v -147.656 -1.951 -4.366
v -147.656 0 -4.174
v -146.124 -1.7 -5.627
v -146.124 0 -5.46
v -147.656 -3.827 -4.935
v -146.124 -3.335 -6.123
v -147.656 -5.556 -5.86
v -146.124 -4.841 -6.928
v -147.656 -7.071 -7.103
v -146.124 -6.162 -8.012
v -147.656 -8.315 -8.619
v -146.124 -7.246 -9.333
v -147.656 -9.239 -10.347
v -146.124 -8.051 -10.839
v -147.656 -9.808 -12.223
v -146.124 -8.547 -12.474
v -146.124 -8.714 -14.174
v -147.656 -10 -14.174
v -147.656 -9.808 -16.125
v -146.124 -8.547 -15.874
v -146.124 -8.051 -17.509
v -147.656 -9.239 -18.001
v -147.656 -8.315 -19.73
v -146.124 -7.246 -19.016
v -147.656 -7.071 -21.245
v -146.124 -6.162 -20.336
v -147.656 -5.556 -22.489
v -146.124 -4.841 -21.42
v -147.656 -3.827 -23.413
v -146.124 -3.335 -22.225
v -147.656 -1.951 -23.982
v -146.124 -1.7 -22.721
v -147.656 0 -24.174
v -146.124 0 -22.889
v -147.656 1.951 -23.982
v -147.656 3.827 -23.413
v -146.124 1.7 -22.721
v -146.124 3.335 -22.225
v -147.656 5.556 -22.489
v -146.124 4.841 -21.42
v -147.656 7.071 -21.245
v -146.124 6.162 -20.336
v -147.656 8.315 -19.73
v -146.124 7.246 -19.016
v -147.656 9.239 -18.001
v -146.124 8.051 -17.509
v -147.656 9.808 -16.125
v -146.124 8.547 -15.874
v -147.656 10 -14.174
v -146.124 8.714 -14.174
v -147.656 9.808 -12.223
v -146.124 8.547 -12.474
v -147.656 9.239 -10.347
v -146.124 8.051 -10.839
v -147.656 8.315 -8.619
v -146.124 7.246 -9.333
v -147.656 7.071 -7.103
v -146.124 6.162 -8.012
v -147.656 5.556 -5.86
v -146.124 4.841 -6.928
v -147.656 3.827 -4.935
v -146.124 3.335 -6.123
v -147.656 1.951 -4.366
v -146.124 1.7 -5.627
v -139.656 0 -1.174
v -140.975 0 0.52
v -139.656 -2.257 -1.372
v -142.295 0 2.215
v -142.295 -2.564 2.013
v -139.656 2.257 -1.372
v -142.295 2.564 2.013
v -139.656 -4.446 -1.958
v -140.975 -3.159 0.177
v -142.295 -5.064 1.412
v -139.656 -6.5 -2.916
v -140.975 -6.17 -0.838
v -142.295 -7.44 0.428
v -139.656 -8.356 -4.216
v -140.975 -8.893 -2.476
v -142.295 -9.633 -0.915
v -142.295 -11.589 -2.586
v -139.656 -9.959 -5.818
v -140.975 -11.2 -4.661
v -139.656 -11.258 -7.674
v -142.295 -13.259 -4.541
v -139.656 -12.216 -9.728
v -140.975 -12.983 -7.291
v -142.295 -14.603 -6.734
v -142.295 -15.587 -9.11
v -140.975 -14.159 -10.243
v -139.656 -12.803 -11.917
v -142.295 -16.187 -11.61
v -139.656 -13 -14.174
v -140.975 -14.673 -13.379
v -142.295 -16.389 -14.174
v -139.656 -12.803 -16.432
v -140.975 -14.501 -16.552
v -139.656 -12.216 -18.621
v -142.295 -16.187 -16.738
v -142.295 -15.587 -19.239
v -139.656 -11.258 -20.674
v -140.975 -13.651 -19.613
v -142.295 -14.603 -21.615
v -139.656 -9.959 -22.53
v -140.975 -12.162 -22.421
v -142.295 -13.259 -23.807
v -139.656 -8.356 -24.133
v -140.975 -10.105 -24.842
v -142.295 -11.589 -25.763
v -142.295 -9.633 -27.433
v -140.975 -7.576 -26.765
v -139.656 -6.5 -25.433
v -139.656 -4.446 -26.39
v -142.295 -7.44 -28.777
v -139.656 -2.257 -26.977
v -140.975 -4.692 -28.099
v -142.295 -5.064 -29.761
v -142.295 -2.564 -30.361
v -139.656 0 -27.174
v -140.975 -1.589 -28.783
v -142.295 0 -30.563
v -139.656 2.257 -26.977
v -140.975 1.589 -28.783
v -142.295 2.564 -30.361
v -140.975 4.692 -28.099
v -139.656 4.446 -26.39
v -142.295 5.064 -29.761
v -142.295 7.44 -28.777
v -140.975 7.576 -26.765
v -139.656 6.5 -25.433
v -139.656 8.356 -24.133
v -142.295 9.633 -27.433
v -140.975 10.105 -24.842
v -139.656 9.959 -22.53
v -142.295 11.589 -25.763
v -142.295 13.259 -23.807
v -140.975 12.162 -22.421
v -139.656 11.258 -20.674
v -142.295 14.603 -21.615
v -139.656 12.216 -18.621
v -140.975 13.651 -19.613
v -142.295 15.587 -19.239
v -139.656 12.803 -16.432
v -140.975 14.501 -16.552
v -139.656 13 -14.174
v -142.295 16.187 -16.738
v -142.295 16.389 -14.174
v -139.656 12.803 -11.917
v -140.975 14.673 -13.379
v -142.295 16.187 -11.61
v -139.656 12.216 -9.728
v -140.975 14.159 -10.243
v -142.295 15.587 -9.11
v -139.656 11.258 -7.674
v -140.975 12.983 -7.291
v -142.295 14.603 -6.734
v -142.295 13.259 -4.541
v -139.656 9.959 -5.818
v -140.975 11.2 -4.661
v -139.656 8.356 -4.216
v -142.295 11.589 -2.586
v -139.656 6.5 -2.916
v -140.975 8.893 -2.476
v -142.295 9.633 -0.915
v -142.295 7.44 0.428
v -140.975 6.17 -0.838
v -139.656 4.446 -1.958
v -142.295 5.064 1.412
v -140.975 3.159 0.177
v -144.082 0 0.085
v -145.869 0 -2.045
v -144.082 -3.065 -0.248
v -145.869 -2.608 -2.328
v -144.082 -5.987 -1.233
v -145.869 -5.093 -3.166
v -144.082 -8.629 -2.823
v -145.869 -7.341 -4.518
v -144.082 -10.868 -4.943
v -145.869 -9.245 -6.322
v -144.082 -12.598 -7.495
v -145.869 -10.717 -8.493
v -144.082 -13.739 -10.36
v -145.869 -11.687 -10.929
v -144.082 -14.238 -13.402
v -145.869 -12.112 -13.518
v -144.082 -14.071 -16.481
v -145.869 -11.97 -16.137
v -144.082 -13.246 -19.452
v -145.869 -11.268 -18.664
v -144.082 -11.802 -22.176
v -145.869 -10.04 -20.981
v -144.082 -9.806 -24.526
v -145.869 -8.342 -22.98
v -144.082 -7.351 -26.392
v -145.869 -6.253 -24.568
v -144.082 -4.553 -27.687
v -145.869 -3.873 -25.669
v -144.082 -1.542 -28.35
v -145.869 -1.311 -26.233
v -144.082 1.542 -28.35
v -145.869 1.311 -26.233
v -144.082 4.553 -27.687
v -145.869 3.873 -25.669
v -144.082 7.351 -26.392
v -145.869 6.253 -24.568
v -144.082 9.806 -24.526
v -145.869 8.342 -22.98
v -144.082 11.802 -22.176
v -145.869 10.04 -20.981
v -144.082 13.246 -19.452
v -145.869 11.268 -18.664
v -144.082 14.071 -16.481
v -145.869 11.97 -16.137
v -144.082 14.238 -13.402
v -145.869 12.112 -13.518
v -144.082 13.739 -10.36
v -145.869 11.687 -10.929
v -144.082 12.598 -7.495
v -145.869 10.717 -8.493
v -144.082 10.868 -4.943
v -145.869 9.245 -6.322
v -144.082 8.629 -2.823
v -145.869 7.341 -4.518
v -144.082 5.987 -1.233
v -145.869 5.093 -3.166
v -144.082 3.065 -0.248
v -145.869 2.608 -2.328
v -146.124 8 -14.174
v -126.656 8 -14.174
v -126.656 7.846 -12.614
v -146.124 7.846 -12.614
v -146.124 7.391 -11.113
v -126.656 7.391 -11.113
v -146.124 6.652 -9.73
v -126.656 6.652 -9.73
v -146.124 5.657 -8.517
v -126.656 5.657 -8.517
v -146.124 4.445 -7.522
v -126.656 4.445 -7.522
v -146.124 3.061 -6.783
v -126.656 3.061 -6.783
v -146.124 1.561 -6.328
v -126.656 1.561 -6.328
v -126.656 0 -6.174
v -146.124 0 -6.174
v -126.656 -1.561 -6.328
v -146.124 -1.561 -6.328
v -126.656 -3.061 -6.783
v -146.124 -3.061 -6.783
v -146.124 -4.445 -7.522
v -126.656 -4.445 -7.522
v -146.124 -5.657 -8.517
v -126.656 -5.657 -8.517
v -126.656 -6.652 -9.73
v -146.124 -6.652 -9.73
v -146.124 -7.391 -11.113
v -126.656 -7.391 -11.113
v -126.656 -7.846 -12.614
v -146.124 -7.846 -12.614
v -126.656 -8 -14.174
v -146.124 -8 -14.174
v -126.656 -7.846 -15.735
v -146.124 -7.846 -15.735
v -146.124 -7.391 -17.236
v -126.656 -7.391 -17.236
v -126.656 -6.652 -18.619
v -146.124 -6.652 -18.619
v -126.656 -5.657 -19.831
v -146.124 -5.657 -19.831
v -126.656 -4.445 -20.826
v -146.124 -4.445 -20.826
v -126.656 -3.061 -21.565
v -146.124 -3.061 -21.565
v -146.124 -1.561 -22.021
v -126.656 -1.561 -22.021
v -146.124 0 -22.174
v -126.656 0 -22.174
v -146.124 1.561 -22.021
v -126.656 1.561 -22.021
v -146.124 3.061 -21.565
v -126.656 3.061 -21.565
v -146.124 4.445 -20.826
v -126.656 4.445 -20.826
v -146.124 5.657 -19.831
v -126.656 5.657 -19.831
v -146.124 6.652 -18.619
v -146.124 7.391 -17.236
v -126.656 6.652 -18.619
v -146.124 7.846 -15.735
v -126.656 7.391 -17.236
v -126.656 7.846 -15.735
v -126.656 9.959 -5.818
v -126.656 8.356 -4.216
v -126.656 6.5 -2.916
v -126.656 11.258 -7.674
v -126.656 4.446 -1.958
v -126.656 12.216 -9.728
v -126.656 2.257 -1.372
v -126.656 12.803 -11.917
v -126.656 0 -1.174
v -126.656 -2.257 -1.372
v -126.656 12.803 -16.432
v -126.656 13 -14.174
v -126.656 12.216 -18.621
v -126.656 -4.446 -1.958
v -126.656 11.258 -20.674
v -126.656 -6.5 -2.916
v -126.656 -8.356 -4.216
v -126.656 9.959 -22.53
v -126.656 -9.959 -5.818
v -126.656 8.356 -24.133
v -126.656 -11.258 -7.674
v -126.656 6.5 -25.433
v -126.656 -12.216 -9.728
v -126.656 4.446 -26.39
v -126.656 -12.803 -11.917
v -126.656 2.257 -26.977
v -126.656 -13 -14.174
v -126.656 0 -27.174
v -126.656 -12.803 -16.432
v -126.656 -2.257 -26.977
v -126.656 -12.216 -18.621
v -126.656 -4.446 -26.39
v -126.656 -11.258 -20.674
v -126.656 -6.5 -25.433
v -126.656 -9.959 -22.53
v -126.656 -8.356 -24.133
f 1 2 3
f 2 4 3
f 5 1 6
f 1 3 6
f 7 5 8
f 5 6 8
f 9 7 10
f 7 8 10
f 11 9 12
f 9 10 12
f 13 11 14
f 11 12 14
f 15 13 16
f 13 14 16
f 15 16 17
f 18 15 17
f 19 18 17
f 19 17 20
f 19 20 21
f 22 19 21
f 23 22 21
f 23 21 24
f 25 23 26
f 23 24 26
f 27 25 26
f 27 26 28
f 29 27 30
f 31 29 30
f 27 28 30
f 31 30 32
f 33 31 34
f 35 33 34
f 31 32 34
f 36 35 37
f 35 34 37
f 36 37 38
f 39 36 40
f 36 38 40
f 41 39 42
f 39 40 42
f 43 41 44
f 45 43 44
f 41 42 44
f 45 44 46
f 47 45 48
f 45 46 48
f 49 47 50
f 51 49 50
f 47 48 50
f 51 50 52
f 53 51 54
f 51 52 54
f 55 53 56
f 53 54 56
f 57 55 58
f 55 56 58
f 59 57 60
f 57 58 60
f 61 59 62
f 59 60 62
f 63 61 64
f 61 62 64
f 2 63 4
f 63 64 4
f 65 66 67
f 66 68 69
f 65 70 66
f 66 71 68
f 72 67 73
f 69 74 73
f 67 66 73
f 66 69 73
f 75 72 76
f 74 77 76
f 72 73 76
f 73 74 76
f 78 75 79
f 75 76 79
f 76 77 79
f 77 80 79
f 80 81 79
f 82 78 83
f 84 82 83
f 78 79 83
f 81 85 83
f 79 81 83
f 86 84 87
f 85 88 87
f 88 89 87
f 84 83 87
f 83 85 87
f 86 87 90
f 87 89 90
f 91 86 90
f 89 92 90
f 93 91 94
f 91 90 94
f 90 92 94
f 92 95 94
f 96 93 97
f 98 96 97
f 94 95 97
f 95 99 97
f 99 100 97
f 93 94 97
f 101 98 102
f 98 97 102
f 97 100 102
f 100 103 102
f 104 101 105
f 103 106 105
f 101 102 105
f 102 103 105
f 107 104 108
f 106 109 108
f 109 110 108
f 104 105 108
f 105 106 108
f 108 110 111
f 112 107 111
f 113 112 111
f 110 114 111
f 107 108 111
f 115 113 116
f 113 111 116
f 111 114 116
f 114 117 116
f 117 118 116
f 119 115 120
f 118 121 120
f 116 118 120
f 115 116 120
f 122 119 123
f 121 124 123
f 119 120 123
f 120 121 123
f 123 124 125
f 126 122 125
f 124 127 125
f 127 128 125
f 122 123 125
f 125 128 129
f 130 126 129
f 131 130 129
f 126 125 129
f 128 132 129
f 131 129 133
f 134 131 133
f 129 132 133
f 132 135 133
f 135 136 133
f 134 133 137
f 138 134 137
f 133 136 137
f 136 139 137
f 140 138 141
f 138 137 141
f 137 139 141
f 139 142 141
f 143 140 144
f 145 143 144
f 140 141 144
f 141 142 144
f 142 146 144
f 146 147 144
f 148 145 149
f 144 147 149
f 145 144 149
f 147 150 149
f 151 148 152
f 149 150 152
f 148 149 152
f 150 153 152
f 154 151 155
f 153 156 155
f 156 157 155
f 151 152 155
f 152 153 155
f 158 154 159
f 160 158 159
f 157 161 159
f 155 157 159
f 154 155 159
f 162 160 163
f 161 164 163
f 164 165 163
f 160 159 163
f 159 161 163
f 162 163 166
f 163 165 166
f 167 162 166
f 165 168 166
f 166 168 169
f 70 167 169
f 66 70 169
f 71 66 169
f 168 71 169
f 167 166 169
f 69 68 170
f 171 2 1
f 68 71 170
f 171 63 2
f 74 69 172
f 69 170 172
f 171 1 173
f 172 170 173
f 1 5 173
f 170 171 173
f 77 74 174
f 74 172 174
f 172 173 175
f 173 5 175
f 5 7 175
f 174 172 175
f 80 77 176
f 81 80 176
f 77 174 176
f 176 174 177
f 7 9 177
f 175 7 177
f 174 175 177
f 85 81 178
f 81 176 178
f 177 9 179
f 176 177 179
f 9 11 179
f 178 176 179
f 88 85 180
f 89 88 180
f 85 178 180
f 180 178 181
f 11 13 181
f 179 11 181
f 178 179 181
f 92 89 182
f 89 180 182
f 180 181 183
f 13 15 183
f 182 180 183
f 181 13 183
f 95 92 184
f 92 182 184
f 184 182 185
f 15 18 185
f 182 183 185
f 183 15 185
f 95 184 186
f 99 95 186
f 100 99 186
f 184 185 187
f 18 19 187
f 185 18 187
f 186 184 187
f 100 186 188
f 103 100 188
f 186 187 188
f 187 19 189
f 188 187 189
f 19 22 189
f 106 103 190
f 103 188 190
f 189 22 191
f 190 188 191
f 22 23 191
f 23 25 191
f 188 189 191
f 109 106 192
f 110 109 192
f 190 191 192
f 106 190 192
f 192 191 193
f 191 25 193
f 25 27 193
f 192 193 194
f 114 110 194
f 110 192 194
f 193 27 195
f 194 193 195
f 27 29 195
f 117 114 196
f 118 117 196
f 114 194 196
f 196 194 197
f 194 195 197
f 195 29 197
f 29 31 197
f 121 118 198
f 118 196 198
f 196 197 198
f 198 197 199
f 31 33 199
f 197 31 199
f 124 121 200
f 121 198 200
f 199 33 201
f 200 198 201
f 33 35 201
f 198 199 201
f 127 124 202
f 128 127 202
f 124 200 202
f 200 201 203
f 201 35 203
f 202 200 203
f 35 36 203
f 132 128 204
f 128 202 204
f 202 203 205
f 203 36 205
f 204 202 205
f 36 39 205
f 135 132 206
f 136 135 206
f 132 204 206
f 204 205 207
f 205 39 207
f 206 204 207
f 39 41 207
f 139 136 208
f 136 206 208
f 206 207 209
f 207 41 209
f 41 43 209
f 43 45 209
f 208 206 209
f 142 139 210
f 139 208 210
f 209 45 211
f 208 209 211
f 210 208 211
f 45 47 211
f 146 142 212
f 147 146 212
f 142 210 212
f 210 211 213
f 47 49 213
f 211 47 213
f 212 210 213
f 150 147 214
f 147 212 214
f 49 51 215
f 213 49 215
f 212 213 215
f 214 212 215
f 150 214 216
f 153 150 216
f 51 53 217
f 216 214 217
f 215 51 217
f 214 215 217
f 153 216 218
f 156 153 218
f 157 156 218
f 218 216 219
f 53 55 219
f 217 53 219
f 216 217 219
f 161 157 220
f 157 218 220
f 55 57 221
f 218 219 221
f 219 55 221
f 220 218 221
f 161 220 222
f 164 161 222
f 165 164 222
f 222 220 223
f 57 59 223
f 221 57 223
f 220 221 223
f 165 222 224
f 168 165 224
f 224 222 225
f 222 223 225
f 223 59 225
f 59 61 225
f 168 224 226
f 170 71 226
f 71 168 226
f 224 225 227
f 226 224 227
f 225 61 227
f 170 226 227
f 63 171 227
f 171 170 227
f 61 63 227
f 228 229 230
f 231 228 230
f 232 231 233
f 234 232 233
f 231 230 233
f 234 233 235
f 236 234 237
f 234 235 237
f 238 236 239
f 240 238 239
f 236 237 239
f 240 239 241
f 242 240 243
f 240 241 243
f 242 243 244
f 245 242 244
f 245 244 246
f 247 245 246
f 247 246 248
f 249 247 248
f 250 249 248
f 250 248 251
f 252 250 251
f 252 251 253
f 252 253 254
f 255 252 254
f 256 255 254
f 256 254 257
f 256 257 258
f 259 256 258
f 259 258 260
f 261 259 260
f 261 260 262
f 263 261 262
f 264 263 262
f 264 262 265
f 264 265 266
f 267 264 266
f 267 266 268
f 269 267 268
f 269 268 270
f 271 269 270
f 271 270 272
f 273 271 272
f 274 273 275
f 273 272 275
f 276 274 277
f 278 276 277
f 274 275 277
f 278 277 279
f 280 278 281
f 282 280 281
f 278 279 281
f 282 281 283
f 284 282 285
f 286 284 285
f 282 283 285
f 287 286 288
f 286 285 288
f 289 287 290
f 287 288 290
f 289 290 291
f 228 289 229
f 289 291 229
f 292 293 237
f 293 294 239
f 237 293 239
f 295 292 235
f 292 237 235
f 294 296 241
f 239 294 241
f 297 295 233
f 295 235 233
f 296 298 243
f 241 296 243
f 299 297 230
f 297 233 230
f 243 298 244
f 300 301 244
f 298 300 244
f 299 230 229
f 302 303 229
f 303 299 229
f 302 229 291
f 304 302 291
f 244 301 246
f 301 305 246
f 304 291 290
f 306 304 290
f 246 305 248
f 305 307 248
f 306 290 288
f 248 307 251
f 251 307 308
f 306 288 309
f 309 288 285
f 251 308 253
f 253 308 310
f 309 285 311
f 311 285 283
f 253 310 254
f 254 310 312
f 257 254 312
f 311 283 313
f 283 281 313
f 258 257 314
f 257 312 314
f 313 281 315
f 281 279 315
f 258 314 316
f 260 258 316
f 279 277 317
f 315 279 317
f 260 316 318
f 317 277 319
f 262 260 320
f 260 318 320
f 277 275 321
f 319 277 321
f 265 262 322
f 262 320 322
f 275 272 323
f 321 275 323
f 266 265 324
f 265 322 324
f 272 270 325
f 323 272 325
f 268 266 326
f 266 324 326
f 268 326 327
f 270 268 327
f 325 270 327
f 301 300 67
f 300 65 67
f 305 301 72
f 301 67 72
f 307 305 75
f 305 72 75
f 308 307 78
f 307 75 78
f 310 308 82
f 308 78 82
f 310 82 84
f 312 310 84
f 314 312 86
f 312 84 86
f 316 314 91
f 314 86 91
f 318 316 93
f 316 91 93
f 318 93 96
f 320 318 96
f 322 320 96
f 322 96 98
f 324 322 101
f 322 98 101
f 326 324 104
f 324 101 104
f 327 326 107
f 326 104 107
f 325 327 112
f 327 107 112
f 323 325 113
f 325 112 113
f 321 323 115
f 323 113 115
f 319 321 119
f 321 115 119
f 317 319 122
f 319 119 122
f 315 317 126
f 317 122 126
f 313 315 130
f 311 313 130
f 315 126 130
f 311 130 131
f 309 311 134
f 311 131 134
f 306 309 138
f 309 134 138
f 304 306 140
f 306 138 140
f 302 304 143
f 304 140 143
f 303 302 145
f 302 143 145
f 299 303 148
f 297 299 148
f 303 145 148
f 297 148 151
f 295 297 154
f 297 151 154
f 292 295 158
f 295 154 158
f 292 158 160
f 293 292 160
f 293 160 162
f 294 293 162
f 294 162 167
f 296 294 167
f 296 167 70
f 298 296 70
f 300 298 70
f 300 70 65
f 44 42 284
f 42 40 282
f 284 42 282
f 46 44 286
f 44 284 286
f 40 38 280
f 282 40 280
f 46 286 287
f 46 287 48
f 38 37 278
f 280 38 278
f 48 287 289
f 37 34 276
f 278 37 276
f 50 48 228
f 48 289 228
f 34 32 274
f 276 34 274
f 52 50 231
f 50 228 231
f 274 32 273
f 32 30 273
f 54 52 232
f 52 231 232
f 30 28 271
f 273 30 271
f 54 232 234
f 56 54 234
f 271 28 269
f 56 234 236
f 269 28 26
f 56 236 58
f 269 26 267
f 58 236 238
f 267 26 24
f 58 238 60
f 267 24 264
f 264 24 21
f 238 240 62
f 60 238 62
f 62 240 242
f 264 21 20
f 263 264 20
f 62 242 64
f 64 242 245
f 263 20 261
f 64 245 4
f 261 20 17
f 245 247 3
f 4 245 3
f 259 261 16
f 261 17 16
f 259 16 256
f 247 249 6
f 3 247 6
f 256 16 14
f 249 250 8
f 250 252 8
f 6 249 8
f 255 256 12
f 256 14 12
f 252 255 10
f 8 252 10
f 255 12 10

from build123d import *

# Parameters (mm, degrees)
F2_R     = 8
F3_DEPTH = 21.001


with BuildPart() as f1:
    # F0 (on Front) → F1 (revolve)
    with BuildSketch(Plane.XZ):
        Polygon((-142.29493, 2.214532), (-147.655754, -4.174249), (-146.123665, -5.459824), (-146.123665, -14.174249), (-126.655754, -14.174249), (-126.655754, -1.174249), (-139.655754, -1.174249), align=None)
    revolve(axis=Axis((-136.38971, 0, -14.174249), (1, 0, 0)))

    # F2 (on face) → F3 (cut, through all)
    with BuildSketch(Plane.YZ.offset(-126.655754)):
        with Locations((0, -14.174249)):
            Circle(F2_R)
    extrude(amount=-F3_DEPTH, mode=Mode.SUBTRACT)


solid = f1.part
